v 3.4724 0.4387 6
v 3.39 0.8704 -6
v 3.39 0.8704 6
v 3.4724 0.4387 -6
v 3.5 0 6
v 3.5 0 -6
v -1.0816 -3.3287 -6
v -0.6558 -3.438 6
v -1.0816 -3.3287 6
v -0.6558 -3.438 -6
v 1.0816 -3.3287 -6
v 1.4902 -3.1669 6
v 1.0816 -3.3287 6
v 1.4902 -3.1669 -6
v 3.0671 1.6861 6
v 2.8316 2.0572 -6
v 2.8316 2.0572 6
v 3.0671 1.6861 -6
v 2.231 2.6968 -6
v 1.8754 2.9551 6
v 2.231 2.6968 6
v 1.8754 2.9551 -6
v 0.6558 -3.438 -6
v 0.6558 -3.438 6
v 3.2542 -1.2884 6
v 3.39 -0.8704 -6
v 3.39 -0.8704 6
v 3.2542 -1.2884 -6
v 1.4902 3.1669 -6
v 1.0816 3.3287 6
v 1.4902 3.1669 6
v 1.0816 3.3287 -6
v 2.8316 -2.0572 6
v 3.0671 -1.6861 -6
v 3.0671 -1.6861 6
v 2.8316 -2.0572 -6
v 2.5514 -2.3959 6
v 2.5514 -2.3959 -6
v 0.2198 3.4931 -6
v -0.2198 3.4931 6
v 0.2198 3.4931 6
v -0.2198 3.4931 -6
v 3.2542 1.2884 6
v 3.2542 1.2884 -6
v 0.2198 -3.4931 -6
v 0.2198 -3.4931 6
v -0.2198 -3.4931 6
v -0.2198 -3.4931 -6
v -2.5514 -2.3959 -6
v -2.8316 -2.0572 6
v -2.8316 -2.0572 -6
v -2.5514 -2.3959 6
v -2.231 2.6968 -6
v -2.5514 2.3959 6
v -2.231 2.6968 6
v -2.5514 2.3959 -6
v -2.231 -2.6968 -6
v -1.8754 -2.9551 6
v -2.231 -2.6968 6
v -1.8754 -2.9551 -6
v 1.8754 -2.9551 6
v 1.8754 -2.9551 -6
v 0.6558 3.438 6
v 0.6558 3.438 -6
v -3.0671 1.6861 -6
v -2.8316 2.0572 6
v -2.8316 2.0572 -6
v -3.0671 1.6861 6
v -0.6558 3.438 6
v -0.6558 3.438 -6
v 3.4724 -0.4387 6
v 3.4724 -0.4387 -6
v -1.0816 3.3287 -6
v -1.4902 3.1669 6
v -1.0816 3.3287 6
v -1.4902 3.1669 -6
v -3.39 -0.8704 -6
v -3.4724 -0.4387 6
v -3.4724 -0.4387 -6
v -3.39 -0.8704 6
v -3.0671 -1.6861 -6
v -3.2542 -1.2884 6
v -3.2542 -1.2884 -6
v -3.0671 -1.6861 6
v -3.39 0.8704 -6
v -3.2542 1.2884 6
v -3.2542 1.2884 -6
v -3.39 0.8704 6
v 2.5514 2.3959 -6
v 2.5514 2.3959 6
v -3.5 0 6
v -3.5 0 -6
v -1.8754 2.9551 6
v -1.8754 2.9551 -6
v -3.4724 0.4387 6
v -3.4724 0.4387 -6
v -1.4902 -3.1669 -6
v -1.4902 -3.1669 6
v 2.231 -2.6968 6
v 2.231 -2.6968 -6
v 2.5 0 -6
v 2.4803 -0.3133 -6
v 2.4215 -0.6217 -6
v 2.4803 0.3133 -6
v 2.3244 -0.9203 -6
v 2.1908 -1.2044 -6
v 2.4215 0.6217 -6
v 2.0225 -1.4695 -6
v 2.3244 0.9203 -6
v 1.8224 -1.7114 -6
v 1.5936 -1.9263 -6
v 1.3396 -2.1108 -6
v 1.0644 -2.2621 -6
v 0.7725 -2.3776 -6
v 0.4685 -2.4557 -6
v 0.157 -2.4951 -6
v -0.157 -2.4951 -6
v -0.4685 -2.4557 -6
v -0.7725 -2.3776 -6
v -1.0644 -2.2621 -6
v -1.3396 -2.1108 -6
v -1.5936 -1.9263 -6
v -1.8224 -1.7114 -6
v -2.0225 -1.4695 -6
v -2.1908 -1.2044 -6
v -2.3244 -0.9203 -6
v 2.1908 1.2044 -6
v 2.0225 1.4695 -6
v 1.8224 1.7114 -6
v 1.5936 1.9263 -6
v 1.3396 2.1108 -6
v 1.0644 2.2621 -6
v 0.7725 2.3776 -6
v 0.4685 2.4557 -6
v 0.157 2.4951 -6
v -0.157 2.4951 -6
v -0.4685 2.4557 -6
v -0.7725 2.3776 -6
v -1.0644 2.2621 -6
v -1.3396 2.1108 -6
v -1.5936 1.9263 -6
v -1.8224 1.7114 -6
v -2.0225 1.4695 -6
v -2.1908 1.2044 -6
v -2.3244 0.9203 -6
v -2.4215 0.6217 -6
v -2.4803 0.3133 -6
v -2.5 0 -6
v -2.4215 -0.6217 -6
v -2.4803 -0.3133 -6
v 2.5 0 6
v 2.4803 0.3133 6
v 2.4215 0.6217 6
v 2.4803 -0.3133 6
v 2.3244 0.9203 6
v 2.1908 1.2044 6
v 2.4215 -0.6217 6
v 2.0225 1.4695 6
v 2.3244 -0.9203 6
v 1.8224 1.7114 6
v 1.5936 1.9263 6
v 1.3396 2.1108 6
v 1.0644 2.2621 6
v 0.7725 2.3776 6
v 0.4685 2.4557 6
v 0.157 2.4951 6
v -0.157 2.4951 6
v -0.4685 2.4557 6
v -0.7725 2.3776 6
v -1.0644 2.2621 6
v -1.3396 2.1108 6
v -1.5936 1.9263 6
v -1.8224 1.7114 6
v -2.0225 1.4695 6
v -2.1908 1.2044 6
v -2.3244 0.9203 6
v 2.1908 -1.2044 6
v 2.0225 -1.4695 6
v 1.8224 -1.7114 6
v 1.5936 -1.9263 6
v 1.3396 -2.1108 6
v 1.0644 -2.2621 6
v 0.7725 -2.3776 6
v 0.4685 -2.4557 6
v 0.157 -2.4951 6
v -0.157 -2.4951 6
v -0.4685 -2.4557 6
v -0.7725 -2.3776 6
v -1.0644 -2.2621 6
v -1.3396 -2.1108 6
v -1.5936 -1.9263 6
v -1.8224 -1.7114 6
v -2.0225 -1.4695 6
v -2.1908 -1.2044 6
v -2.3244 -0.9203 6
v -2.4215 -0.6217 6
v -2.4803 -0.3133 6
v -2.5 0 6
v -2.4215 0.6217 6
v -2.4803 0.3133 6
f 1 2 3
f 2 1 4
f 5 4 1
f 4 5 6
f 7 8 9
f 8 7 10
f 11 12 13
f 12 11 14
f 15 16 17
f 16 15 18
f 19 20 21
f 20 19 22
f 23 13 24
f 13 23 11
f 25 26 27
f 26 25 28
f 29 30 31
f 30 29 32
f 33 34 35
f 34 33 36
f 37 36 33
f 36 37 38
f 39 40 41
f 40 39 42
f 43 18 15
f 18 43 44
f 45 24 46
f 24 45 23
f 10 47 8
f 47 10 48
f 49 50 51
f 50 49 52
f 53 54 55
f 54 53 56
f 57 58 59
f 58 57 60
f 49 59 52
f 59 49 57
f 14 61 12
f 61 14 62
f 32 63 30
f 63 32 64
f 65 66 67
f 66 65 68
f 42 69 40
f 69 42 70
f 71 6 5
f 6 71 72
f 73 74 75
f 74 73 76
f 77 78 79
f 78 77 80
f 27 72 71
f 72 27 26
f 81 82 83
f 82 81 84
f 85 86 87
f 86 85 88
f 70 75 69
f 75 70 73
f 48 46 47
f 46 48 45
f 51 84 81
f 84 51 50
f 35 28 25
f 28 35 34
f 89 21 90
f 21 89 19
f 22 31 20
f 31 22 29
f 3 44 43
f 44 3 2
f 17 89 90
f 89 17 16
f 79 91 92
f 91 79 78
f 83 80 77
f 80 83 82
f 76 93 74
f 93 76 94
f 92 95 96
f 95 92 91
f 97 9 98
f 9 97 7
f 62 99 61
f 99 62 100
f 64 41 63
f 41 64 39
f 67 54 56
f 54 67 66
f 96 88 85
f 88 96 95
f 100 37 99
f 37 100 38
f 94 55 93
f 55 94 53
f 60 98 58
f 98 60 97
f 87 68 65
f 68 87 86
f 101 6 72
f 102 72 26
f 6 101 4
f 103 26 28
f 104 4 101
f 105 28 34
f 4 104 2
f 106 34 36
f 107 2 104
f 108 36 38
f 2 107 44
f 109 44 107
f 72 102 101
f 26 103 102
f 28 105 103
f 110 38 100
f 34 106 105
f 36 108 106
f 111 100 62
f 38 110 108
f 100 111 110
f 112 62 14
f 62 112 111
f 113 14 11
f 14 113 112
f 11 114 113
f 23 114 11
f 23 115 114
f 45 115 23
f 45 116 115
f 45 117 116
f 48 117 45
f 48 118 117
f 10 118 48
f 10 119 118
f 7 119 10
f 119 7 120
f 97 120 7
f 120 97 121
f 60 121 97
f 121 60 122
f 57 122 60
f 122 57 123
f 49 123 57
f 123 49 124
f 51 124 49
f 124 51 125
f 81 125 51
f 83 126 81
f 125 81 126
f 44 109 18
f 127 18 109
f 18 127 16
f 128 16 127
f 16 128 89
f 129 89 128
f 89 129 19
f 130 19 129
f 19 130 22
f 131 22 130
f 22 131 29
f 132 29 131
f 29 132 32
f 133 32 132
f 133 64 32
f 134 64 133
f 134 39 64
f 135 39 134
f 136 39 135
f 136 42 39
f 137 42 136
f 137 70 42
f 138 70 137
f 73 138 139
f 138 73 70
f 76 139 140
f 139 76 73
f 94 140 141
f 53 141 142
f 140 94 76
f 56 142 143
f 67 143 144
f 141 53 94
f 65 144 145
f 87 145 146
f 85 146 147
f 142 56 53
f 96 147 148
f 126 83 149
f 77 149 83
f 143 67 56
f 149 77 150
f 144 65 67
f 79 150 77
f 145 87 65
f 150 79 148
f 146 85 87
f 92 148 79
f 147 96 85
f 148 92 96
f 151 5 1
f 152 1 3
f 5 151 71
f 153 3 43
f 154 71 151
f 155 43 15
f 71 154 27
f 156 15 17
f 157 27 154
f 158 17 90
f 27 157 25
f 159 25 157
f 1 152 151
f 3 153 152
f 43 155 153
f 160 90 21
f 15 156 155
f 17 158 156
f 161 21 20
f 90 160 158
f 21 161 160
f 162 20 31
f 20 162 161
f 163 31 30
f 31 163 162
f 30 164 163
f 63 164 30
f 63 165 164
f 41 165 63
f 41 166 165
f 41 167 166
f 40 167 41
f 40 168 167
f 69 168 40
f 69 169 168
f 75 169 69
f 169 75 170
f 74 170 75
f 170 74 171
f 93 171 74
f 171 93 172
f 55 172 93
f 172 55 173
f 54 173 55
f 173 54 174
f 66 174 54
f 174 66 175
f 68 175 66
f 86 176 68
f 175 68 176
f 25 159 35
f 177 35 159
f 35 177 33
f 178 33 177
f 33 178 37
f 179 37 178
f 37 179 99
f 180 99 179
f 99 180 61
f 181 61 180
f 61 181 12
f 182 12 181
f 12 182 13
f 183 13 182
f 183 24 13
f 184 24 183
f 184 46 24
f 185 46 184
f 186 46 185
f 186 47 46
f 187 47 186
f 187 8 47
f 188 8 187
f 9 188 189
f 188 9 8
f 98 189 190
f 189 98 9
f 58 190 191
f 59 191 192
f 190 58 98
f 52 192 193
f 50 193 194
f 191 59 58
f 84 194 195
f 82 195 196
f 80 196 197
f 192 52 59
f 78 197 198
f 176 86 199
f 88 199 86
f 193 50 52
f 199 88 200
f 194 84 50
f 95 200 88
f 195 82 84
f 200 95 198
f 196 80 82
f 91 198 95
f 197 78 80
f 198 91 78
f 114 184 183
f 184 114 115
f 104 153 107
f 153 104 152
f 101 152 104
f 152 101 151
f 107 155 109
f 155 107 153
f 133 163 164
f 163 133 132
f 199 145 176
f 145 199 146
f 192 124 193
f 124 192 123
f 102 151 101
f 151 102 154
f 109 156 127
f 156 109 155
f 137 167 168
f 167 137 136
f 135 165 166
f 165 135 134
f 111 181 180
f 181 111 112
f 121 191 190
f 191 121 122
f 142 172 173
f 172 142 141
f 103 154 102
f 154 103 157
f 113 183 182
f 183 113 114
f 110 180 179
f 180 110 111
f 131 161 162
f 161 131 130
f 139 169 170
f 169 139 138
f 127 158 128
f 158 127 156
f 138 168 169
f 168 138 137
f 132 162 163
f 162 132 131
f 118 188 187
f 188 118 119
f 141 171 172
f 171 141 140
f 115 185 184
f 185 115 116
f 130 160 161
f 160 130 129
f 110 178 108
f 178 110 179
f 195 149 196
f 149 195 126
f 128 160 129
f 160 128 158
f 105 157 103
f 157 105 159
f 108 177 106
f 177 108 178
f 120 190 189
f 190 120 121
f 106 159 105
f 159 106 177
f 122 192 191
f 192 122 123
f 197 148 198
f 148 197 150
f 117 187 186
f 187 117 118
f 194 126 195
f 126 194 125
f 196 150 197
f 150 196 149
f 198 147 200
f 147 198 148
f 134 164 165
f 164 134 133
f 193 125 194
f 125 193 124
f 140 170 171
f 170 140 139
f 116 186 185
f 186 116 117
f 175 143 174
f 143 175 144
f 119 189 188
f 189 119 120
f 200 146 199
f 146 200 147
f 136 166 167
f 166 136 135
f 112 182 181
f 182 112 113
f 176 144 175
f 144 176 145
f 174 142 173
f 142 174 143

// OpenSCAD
$fn = 50;


difference() {
	union() {
		translate(v = [0, 0, -6.0000000000]) {
			cylinder(h = 12, r = 3.5000000000);
		}
	}
	union() {
		translate(v = [0, 0, -100.0000000000]) {
			cylinder(h = 200, r = 2.5000000000);
		}
	}
}
